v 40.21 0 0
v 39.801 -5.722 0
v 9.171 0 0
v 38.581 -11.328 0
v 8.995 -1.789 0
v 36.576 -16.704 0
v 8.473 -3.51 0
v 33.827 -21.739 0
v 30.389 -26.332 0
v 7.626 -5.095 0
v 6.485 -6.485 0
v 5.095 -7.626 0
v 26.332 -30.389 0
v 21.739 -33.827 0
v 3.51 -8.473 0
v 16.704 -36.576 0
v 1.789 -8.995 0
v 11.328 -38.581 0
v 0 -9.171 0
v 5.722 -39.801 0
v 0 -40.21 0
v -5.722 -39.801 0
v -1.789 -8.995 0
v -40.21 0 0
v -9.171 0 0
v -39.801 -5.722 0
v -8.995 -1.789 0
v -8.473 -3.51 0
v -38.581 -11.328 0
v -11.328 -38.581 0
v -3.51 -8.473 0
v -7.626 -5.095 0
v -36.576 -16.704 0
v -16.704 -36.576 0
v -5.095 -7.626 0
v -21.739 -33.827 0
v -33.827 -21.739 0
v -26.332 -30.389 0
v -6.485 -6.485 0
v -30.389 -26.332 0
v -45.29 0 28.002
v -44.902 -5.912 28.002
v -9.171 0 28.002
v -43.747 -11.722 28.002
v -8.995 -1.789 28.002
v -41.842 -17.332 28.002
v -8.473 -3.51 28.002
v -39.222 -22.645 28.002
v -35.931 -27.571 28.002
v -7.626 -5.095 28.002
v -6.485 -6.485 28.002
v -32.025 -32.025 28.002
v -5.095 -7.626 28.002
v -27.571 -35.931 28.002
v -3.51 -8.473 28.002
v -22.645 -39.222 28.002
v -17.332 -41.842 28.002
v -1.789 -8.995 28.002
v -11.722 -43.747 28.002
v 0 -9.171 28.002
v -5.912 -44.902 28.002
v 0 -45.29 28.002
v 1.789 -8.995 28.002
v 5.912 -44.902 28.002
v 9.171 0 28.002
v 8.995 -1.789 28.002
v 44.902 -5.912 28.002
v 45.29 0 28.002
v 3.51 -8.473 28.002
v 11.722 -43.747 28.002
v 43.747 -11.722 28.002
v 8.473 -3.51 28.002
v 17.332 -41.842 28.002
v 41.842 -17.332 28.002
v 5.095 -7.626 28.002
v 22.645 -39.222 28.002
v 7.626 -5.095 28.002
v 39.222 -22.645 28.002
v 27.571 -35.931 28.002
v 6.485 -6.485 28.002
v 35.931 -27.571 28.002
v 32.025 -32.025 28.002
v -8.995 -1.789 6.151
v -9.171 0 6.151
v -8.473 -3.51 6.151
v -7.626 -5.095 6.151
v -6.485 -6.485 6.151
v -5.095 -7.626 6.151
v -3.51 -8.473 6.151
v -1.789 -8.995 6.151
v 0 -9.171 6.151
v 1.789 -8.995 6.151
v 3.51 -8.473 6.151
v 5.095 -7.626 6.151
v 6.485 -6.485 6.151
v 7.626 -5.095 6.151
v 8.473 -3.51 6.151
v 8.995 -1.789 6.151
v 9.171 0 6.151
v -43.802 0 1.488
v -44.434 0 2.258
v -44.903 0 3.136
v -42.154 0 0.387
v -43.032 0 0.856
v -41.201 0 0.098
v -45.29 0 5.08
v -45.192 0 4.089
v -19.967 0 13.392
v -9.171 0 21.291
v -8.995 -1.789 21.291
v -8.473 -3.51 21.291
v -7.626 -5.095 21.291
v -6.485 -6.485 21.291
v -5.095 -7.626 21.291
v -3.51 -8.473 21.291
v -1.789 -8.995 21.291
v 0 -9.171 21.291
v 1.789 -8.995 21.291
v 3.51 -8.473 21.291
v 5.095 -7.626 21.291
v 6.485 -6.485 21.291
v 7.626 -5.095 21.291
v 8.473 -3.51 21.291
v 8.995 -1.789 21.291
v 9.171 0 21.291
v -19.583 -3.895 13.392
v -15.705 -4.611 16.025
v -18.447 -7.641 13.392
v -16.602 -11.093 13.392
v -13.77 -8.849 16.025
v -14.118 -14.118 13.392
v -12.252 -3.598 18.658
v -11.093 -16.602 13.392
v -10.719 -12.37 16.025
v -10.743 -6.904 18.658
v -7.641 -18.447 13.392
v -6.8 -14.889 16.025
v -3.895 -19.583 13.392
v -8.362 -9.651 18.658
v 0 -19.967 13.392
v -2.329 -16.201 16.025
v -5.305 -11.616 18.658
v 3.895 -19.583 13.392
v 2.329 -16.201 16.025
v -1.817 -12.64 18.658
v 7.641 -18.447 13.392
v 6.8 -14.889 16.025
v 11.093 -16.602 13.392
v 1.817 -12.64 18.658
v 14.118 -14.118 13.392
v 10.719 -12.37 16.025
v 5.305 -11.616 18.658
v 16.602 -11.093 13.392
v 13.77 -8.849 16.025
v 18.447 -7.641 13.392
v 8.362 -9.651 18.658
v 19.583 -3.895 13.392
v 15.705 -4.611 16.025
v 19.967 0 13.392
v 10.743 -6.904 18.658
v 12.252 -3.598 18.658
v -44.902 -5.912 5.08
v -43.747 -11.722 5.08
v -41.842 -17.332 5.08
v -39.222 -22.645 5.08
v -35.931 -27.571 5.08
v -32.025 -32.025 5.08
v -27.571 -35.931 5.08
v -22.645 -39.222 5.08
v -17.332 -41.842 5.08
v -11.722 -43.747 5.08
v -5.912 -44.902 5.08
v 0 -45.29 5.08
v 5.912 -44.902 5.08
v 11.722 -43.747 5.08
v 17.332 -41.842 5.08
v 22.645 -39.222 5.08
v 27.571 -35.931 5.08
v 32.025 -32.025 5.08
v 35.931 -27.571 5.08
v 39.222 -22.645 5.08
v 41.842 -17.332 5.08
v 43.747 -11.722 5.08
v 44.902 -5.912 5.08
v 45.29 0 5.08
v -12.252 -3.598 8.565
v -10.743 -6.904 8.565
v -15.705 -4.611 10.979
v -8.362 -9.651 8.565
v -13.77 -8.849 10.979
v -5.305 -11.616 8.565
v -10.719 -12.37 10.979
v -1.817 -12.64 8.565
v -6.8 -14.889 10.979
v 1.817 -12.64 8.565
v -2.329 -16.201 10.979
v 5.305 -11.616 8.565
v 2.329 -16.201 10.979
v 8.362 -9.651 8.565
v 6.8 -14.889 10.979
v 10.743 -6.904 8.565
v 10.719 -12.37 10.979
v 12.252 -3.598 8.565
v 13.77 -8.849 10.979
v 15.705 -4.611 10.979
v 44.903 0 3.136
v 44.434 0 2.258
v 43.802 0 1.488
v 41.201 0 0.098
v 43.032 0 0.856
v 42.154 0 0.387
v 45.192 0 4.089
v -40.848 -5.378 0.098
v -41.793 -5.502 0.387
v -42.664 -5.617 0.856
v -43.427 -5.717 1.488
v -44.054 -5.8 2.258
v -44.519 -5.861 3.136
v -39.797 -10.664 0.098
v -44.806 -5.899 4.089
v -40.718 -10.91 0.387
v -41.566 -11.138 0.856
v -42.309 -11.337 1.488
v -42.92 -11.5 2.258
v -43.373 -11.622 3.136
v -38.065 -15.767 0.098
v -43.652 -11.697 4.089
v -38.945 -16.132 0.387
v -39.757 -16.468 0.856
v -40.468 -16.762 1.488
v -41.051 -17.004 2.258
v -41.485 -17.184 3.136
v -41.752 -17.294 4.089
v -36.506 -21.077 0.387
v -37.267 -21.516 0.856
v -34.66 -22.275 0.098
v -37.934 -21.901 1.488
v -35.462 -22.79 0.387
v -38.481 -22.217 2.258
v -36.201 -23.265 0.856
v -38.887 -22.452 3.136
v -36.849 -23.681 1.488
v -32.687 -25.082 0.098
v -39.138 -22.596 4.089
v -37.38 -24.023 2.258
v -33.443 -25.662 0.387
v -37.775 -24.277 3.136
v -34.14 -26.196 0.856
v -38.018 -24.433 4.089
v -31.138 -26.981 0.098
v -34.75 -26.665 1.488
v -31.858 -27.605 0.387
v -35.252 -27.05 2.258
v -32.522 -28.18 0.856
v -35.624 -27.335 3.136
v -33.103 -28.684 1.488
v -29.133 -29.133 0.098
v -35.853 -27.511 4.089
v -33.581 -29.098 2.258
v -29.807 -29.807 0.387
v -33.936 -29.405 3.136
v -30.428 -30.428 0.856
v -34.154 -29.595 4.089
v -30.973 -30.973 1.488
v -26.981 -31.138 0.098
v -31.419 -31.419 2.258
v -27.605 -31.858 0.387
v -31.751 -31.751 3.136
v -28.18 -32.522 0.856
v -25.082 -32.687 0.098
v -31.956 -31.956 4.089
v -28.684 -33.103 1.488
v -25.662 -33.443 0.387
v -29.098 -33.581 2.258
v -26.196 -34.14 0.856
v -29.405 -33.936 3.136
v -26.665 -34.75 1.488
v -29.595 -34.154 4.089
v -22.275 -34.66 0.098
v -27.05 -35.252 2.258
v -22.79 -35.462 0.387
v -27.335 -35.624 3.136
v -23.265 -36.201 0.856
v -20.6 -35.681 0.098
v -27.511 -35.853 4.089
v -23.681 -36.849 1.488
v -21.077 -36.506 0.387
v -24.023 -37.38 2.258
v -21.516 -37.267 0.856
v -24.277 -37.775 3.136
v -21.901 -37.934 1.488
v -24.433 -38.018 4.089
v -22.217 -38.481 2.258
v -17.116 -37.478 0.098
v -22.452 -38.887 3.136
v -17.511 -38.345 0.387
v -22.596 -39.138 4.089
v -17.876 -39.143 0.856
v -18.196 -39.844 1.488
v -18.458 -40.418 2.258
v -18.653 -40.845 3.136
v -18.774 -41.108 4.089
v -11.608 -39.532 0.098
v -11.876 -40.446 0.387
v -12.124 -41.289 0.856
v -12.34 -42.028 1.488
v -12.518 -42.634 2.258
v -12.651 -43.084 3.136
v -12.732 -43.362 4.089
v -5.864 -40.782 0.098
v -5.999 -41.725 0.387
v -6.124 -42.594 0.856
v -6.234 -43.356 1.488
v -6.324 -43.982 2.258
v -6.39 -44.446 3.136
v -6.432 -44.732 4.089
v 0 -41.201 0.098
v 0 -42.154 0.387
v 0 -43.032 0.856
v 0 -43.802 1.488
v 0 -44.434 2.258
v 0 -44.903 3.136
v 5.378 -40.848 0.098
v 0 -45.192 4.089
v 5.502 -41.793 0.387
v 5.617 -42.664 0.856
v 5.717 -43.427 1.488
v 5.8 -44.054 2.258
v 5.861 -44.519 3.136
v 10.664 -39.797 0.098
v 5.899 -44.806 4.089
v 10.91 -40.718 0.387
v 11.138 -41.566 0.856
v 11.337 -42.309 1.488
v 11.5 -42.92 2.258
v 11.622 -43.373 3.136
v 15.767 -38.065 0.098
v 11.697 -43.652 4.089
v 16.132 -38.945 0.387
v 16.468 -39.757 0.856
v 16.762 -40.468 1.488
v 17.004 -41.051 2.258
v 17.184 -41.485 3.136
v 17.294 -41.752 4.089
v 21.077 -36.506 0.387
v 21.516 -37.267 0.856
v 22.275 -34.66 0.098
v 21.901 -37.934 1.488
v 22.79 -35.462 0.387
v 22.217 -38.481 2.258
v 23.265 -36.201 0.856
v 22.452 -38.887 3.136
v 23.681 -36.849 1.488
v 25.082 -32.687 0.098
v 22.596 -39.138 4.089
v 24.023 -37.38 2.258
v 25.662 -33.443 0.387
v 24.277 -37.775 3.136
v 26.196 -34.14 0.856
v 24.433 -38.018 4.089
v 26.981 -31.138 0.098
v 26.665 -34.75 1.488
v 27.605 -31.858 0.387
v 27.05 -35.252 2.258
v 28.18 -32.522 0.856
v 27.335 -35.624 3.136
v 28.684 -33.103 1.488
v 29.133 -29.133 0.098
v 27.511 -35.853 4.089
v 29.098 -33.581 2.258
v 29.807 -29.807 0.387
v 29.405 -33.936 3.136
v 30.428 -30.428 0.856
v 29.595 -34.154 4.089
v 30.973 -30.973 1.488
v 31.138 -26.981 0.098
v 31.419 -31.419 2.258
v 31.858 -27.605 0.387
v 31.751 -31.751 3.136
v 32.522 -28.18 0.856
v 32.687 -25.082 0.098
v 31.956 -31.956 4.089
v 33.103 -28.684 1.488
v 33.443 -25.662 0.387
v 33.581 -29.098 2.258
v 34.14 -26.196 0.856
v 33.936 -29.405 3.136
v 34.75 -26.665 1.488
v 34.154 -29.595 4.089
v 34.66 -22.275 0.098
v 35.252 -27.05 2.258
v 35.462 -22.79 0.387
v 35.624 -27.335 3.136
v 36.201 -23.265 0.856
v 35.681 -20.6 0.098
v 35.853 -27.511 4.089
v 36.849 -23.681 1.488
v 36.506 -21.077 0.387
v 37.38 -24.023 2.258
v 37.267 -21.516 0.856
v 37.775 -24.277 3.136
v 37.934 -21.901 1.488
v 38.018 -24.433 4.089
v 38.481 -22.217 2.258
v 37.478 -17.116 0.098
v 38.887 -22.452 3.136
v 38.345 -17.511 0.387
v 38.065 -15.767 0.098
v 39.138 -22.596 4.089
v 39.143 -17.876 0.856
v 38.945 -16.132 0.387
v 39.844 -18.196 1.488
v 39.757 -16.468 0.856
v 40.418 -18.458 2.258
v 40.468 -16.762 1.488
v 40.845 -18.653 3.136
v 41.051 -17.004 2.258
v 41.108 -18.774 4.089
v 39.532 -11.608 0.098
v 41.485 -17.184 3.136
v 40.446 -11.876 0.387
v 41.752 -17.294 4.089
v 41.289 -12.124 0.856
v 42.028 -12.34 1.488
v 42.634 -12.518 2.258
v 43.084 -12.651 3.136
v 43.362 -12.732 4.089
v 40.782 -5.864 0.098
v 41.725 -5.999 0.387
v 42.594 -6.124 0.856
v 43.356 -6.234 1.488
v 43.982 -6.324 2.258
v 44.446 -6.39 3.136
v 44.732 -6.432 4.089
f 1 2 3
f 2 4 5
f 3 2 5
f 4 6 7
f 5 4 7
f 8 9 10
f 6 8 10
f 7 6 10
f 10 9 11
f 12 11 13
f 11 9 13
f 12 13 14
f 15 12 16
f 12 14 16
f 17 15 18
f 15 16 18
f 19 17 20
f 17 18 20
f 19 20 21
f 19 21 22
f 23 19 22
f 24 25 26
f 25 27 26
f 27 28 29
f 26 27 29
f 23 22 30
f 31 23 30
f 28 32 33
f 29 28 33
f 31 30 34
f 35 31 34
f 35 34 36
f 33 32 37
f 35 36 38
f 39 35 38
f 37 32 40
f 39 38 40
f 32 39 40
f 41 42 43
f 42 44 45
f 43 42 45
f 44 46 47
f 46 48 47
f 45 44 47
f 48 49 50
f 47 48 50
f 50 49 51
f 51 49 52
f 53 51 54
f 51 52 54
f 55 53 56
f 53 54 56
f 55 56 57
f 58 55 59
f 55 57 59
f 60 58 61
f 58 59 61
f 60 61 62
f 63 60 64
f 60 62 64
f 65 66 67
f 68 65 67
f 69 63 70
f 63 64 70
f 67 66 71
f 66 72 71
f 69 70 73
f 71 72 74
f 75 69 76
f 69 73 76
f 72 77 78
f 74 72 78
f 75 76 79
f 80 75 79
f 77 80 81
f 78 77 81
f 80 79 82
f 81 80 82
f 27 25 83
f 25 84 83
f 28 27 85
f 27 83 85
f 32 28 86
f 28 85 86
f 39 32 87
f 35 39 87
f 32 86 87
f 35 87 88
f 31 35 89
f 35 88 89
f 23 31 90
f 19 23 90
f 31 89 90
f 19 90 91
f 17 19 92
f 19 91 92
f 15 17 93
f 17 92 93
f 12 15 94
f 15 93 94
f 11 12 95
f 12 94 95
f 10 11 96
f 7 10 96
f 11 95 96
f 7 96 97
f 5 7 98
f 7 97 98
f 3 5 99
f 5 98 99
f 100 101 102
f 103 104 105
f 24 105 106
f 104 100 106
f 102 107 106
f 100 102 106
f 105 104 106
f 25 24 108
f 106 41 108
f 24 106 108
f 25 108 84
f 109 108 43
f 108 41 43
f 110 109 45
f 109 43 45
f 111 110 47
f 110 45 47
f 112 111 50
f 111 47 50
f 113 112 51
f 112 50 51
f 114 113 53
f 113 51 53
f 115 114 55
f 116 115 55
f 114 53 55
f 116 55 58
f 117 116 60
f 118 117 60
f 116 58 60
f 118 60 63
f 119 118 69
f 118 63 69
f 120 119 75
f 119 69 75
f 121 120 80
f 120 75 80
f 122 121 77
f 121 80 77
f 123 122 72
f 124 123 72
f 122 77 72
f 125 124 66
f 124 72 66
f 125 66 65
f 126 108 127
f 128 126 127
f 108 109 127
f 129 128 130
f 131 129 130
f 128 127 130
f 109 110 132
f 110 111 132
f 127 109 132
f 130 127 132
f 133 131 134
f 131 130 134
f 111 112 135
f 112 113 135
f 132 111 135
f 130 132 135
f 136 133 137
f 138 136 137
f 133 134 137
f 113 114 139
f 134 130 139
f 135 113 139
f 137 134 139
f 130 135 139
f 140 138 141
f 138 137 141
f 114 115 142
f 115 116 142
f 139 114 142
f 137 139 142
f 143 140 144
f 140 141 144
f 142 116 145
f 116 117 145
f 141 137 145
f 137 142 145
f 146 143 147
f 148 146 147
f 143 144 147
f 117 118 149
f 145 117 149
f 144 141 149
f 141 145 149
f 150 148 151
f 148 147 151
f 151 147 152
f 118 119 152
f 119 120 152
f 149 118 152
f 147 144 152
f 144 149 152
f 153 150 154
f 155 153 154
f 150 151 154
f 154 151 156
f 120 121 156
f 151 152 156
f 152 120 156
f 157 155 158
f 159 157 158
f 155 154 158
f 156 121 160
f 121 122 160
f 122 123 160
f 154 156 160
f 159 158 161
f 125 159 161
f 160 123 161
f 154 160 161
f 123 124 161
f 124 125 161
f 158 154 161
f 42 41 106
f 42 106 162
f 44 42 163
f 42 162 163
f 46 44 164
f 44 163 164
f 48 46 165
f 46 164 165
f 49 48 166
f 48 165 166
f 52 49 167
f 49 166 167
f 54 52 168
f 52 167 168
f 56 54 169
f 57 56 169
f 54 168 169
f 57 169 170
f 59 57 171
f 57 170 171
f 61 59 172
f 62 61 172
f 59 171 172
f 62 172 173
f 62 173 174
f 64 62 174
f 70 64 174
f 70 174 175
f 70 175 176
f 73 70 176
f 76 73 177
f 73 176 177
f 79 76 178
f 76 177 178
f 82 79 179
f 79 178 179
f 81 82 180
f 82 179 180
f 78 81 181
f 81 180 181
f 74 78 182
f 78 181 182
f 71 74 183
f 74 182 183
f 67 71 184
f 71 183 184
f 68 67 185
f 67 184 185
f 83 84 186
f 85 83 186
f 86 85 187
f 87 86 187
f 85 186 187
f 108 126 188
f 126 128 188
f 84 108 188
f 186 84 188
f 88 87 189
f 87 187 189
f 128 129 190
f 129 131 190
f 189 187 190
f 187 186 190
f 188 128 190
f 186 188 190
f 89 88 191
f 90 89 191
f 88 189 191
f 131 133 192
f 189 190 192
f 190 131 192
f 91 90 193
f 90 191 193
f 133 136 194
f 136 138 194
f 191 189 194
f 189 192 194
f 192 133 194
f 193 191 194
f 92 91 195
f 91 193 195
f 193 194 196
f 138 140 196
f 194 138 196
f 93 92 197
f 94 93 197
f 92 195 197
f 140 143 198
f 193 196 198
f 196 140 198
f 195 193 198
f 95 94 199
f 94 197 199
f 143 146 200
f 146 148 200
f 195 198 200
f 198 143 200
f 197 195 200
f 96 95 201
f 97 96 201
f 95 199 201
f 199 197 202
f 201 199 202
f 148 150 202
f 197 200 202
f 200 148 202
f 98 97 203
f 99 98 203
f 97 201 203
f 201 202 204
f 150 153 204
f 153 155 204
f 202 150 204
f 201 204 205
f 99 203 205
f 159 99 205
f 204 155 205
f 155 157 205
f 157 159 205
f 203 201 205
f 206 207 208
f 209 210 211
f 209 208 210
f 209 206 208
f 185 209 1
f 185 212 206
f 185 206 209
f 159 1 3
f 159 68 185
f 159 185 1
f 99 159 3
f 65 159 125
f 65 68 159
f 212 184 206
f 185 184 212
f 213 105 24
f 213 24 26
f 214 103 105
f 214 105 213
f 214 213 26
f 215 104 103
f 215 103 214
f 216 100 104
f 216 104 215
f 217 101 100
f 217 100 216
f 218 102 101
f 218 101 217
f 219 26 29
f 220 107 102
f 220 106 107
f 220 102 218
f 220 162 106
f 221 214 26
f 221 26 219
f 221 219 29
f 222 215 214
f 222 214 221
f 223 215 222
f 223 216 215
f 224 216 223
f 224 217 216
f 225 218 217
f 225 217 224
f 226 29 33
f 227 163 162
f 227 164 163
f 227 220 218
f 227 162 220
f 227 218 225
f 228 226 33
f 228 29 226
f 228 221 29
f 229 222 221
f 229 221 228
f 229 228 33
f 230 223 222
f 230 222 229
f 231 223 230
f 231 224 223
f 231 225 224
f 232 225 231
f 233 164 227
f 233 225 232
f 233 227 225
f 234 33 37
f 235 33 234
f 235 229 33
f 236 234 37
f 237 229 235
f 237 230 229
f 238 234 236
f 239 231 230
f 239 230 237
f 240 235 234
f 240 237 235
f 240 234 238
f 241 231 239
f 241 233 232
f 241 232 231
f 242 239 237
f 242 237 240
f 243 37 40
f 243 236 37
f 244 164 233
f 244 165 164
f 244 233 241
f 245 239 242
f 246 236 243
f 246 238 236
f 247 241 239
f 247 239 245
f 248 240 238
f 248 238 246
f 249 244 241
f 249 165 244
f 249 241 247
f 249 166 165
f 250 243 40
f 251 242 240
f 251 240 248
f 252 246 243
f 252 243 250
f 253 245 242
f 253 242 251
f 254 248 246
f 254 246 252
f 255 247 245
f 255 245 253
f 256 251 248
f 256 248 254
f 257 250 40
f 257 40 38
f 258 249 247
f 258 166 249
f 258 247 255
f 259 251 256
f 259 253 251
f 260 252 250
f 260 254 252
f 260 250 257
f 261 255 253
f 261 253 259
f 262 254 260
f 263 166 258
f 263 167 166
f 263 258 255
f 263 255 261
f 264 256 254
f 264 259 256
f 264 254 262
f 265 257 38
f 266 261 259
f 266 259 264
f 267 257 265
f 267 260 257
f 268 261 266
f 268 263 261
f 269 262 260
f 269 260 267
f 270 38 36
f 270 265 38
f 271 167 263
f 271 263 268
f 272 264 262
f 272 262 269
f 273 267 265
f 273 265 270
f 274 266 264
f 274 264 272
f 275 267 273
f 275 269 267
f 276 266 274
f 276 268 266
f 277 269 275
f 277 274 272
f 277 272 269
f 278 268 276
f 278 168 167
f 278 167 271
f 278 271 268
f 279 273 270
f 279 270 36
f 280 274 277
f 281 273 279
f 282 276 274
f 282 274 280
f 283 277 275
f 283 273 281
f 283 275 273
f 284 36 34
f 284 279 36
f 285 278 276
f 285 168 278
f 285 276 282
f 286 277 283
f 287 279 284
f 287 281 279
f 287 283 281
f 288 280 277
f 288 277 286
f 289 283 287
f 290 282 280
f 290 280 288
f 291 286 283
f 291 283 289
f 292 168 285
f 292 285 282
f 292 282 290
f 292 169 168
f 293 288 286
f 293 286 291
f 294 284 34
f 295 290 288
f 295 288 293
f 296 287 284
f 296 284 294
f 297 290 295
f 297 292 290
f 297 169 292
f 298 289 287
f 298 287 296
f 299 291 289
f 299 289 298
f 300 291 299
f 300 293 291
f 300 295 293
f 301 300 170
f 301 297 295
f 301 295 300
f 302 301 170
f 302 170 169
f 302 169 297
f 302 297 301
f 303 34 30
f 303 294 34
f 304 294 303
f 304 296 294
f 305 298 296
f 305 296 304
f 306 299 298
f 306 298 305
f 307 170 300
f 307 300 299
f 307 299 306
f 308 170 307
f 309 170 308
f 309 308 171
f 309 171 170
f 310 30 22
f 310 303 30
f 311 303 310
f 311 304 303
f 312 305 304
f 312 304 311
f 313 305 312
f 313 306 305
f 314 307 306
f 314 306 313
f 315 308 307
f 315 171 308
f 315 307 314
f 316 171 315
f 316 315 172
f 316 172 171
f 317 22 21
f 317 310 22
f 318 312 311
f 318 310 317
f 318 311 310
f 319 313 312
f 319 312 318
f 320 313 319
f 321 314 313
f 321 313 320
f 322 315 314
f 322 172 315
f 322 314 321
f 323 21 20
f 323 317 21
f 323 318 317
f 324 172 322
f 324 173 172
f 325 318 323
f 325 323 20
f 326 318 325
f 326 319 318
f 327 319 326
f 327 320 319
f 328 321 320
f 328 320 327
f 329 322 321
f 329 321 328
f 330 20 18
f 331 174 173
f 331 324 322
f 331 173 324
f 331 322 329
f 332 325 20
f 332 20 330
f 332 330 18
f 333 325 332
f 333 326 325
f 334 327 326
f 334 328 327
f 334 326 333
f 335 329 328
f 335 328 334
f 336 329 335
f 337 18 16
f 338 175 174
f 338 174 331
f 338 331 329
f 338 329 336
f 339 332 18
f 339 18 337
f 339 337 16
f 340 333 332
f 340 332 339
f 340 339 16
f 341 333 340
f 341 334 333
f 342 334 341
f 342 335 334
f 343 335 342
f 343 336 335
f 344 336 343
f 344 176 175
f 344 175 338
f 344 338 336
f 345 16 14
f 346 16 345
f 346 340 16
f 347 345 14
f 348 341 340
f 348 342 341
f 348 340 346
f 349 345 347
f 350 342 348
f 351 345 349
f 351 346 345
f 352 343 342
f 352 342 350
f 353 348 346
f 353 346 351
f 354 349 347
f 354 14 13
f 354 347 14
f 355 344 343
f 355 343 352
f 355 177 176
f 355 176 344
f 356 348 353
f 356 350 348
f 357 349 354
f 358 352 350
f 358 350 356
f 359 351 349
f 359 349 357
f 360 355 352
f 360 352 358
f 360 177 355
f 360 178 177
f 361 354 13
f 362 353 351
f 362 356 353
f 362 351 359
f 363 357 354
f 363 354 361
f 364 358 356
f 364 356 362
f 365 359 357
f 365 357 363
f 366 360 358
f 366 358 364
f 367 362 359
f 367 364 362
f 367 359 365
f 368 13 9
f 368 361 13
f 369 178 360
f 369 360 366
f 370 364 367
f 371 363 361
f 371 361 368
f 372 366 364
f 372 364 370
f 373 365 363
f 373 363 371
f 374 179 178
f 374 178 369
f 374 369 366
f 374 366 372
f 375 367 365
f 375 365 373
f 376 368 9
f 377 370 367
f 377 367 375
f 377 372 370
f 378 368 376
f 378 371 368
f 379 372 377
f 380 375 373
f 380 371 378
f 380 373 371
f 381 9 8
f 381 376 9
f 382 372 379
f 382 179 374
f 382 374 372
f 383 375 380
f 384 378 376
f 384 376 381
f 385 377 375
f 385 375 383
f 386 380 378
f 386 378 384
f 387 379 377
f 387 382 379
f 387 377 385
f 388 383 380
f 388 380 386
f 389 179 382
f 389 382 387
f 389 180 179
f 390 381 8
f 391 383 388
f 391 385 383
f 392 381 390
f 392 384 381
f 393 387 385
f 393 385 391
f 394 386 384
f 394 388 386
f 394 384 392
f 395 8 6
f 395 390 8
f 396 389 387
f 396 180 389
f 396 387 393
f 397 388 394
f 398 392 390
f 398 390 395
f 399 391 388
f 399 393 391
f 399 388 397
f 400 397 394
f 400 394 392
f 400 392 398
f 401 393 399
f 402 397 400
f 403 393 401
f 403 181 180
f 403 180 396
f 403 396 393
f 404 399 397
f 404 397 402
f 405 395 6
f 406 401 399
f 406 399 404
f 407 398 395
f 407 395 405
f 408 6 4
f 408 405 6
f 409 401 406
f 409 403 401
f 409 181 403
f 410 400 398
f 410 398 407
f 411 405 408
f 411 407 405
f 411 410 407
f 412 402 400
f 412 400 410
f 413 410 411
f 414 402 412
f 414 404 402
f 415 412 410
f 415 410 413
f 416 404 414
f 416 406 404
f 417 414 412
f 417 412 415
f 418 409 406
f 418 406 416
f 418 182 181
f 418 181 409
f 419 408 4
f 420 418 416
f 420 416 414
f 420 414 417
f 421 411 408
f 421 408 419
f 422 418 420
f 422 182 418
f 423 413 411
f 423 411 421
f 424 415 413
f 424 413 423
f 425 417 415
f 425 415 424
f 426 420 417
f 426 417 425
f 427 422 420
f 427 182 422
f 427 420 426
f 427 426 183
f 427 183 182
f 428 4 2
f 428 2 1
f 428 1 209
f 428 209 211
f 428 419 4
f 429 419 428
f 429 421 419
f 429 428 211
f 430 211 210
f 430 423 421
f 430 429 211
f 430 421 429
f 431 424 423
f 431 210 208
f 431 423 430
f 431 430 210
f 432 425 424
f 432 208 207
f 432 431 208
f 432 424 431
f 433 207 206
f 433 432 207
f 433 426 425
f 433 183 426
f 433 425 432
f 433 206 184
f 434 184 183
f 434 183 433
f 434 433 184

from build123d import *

# Parameters (mm, degrees)
F1_ANGLE = 180
F2_R     = 5.08


with BuildPart() as f1:
    # F0 (on Front) → F1 (revolve)
    with BuildSketch(Plane.XZ):
        Polygon((-45.289915, 0), (-9.171271, 0), (-9.171271, 6.151464), (-19.96652, 13.392183), (-9.171271, 21.291147), (-9.171271, 28.001834), (-45.289915, 28.001834), align=None)
    revolve(axis=Axis((0, 0, 31.041022), (0, 0, 1)), revolution_arc=F1_ANGLE)

    # F2
    f2_edges = [f1.edges().sort_by_distance(p)[0] for p in [
        (0, -45.289915, 0),
    ]]
    fillet(f2_edges, radius=F2_R)


solid = f1.part
